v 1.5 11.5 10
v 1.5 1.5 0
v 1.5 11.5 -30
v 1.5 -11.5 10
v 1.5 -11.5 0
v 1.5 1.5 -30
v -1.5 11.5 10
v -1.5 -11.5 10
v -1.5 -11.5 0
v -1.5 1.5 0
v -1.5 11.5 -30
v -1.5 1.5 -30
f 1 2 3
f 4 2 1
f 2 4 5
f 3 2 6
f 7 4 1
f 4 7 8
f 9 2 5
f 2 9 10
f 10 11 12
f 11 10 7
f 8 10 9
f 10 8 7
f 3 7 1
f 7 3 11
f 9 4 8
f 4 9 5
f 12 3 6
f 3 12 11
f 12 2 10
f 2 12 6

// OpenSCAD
// file: ../config.scad
// all measures in millimeters

// rendering quality
$fn = 200;

// material to cut from
material_z = 3;

// wall configuration: bounding box measures
wall_x = 550;
wall_y = 150;
wall_z = 400;

wall_width = 30;
foot_z = 30;

// pots are hung at wall supports
support_count = 5;
support_z = 30;

// pot configuration: outer measures of the top opening
pot_x = 70;
pot_y = 70;
pot_z = 50;

// pots have hooks to hang at the wall supports
hook_width = 10;
// main file
include <../config.scad>;

module pot_side(x)
{
    translate([
        x,
        -material_z/2,
        0
        ])
    intersection()
    {
        // scale to configured size
        scale([
            material_z,
            pot_y,
            pot_z
            ])
        // rotate into yz plane
        rotate([
            0,
            90,
            0
            ])
        circle(
            r=1
            );

        // z: negative, y: negative
        translate([
            0,
            -pot_y,
            -pot_z
            ])
        cube([
            2*material_z,
            2*pot_y,
            2*pot_z
            ], center=true);
    }

    // upper hook part
    translate([
        x,
        0,
        hook_width/2
        ])
    cube([
        material_z,
        hook_width*2 + material_z,
        hook_width
        ], center=true);

    // hook
    translate([
        x,
        hook_width/2 + material_z/2,
        -support_z/2
        ])
    cube([
        material_z,
        hook_width,
        support_z
        ], center=true);
}

pot_side(0);
